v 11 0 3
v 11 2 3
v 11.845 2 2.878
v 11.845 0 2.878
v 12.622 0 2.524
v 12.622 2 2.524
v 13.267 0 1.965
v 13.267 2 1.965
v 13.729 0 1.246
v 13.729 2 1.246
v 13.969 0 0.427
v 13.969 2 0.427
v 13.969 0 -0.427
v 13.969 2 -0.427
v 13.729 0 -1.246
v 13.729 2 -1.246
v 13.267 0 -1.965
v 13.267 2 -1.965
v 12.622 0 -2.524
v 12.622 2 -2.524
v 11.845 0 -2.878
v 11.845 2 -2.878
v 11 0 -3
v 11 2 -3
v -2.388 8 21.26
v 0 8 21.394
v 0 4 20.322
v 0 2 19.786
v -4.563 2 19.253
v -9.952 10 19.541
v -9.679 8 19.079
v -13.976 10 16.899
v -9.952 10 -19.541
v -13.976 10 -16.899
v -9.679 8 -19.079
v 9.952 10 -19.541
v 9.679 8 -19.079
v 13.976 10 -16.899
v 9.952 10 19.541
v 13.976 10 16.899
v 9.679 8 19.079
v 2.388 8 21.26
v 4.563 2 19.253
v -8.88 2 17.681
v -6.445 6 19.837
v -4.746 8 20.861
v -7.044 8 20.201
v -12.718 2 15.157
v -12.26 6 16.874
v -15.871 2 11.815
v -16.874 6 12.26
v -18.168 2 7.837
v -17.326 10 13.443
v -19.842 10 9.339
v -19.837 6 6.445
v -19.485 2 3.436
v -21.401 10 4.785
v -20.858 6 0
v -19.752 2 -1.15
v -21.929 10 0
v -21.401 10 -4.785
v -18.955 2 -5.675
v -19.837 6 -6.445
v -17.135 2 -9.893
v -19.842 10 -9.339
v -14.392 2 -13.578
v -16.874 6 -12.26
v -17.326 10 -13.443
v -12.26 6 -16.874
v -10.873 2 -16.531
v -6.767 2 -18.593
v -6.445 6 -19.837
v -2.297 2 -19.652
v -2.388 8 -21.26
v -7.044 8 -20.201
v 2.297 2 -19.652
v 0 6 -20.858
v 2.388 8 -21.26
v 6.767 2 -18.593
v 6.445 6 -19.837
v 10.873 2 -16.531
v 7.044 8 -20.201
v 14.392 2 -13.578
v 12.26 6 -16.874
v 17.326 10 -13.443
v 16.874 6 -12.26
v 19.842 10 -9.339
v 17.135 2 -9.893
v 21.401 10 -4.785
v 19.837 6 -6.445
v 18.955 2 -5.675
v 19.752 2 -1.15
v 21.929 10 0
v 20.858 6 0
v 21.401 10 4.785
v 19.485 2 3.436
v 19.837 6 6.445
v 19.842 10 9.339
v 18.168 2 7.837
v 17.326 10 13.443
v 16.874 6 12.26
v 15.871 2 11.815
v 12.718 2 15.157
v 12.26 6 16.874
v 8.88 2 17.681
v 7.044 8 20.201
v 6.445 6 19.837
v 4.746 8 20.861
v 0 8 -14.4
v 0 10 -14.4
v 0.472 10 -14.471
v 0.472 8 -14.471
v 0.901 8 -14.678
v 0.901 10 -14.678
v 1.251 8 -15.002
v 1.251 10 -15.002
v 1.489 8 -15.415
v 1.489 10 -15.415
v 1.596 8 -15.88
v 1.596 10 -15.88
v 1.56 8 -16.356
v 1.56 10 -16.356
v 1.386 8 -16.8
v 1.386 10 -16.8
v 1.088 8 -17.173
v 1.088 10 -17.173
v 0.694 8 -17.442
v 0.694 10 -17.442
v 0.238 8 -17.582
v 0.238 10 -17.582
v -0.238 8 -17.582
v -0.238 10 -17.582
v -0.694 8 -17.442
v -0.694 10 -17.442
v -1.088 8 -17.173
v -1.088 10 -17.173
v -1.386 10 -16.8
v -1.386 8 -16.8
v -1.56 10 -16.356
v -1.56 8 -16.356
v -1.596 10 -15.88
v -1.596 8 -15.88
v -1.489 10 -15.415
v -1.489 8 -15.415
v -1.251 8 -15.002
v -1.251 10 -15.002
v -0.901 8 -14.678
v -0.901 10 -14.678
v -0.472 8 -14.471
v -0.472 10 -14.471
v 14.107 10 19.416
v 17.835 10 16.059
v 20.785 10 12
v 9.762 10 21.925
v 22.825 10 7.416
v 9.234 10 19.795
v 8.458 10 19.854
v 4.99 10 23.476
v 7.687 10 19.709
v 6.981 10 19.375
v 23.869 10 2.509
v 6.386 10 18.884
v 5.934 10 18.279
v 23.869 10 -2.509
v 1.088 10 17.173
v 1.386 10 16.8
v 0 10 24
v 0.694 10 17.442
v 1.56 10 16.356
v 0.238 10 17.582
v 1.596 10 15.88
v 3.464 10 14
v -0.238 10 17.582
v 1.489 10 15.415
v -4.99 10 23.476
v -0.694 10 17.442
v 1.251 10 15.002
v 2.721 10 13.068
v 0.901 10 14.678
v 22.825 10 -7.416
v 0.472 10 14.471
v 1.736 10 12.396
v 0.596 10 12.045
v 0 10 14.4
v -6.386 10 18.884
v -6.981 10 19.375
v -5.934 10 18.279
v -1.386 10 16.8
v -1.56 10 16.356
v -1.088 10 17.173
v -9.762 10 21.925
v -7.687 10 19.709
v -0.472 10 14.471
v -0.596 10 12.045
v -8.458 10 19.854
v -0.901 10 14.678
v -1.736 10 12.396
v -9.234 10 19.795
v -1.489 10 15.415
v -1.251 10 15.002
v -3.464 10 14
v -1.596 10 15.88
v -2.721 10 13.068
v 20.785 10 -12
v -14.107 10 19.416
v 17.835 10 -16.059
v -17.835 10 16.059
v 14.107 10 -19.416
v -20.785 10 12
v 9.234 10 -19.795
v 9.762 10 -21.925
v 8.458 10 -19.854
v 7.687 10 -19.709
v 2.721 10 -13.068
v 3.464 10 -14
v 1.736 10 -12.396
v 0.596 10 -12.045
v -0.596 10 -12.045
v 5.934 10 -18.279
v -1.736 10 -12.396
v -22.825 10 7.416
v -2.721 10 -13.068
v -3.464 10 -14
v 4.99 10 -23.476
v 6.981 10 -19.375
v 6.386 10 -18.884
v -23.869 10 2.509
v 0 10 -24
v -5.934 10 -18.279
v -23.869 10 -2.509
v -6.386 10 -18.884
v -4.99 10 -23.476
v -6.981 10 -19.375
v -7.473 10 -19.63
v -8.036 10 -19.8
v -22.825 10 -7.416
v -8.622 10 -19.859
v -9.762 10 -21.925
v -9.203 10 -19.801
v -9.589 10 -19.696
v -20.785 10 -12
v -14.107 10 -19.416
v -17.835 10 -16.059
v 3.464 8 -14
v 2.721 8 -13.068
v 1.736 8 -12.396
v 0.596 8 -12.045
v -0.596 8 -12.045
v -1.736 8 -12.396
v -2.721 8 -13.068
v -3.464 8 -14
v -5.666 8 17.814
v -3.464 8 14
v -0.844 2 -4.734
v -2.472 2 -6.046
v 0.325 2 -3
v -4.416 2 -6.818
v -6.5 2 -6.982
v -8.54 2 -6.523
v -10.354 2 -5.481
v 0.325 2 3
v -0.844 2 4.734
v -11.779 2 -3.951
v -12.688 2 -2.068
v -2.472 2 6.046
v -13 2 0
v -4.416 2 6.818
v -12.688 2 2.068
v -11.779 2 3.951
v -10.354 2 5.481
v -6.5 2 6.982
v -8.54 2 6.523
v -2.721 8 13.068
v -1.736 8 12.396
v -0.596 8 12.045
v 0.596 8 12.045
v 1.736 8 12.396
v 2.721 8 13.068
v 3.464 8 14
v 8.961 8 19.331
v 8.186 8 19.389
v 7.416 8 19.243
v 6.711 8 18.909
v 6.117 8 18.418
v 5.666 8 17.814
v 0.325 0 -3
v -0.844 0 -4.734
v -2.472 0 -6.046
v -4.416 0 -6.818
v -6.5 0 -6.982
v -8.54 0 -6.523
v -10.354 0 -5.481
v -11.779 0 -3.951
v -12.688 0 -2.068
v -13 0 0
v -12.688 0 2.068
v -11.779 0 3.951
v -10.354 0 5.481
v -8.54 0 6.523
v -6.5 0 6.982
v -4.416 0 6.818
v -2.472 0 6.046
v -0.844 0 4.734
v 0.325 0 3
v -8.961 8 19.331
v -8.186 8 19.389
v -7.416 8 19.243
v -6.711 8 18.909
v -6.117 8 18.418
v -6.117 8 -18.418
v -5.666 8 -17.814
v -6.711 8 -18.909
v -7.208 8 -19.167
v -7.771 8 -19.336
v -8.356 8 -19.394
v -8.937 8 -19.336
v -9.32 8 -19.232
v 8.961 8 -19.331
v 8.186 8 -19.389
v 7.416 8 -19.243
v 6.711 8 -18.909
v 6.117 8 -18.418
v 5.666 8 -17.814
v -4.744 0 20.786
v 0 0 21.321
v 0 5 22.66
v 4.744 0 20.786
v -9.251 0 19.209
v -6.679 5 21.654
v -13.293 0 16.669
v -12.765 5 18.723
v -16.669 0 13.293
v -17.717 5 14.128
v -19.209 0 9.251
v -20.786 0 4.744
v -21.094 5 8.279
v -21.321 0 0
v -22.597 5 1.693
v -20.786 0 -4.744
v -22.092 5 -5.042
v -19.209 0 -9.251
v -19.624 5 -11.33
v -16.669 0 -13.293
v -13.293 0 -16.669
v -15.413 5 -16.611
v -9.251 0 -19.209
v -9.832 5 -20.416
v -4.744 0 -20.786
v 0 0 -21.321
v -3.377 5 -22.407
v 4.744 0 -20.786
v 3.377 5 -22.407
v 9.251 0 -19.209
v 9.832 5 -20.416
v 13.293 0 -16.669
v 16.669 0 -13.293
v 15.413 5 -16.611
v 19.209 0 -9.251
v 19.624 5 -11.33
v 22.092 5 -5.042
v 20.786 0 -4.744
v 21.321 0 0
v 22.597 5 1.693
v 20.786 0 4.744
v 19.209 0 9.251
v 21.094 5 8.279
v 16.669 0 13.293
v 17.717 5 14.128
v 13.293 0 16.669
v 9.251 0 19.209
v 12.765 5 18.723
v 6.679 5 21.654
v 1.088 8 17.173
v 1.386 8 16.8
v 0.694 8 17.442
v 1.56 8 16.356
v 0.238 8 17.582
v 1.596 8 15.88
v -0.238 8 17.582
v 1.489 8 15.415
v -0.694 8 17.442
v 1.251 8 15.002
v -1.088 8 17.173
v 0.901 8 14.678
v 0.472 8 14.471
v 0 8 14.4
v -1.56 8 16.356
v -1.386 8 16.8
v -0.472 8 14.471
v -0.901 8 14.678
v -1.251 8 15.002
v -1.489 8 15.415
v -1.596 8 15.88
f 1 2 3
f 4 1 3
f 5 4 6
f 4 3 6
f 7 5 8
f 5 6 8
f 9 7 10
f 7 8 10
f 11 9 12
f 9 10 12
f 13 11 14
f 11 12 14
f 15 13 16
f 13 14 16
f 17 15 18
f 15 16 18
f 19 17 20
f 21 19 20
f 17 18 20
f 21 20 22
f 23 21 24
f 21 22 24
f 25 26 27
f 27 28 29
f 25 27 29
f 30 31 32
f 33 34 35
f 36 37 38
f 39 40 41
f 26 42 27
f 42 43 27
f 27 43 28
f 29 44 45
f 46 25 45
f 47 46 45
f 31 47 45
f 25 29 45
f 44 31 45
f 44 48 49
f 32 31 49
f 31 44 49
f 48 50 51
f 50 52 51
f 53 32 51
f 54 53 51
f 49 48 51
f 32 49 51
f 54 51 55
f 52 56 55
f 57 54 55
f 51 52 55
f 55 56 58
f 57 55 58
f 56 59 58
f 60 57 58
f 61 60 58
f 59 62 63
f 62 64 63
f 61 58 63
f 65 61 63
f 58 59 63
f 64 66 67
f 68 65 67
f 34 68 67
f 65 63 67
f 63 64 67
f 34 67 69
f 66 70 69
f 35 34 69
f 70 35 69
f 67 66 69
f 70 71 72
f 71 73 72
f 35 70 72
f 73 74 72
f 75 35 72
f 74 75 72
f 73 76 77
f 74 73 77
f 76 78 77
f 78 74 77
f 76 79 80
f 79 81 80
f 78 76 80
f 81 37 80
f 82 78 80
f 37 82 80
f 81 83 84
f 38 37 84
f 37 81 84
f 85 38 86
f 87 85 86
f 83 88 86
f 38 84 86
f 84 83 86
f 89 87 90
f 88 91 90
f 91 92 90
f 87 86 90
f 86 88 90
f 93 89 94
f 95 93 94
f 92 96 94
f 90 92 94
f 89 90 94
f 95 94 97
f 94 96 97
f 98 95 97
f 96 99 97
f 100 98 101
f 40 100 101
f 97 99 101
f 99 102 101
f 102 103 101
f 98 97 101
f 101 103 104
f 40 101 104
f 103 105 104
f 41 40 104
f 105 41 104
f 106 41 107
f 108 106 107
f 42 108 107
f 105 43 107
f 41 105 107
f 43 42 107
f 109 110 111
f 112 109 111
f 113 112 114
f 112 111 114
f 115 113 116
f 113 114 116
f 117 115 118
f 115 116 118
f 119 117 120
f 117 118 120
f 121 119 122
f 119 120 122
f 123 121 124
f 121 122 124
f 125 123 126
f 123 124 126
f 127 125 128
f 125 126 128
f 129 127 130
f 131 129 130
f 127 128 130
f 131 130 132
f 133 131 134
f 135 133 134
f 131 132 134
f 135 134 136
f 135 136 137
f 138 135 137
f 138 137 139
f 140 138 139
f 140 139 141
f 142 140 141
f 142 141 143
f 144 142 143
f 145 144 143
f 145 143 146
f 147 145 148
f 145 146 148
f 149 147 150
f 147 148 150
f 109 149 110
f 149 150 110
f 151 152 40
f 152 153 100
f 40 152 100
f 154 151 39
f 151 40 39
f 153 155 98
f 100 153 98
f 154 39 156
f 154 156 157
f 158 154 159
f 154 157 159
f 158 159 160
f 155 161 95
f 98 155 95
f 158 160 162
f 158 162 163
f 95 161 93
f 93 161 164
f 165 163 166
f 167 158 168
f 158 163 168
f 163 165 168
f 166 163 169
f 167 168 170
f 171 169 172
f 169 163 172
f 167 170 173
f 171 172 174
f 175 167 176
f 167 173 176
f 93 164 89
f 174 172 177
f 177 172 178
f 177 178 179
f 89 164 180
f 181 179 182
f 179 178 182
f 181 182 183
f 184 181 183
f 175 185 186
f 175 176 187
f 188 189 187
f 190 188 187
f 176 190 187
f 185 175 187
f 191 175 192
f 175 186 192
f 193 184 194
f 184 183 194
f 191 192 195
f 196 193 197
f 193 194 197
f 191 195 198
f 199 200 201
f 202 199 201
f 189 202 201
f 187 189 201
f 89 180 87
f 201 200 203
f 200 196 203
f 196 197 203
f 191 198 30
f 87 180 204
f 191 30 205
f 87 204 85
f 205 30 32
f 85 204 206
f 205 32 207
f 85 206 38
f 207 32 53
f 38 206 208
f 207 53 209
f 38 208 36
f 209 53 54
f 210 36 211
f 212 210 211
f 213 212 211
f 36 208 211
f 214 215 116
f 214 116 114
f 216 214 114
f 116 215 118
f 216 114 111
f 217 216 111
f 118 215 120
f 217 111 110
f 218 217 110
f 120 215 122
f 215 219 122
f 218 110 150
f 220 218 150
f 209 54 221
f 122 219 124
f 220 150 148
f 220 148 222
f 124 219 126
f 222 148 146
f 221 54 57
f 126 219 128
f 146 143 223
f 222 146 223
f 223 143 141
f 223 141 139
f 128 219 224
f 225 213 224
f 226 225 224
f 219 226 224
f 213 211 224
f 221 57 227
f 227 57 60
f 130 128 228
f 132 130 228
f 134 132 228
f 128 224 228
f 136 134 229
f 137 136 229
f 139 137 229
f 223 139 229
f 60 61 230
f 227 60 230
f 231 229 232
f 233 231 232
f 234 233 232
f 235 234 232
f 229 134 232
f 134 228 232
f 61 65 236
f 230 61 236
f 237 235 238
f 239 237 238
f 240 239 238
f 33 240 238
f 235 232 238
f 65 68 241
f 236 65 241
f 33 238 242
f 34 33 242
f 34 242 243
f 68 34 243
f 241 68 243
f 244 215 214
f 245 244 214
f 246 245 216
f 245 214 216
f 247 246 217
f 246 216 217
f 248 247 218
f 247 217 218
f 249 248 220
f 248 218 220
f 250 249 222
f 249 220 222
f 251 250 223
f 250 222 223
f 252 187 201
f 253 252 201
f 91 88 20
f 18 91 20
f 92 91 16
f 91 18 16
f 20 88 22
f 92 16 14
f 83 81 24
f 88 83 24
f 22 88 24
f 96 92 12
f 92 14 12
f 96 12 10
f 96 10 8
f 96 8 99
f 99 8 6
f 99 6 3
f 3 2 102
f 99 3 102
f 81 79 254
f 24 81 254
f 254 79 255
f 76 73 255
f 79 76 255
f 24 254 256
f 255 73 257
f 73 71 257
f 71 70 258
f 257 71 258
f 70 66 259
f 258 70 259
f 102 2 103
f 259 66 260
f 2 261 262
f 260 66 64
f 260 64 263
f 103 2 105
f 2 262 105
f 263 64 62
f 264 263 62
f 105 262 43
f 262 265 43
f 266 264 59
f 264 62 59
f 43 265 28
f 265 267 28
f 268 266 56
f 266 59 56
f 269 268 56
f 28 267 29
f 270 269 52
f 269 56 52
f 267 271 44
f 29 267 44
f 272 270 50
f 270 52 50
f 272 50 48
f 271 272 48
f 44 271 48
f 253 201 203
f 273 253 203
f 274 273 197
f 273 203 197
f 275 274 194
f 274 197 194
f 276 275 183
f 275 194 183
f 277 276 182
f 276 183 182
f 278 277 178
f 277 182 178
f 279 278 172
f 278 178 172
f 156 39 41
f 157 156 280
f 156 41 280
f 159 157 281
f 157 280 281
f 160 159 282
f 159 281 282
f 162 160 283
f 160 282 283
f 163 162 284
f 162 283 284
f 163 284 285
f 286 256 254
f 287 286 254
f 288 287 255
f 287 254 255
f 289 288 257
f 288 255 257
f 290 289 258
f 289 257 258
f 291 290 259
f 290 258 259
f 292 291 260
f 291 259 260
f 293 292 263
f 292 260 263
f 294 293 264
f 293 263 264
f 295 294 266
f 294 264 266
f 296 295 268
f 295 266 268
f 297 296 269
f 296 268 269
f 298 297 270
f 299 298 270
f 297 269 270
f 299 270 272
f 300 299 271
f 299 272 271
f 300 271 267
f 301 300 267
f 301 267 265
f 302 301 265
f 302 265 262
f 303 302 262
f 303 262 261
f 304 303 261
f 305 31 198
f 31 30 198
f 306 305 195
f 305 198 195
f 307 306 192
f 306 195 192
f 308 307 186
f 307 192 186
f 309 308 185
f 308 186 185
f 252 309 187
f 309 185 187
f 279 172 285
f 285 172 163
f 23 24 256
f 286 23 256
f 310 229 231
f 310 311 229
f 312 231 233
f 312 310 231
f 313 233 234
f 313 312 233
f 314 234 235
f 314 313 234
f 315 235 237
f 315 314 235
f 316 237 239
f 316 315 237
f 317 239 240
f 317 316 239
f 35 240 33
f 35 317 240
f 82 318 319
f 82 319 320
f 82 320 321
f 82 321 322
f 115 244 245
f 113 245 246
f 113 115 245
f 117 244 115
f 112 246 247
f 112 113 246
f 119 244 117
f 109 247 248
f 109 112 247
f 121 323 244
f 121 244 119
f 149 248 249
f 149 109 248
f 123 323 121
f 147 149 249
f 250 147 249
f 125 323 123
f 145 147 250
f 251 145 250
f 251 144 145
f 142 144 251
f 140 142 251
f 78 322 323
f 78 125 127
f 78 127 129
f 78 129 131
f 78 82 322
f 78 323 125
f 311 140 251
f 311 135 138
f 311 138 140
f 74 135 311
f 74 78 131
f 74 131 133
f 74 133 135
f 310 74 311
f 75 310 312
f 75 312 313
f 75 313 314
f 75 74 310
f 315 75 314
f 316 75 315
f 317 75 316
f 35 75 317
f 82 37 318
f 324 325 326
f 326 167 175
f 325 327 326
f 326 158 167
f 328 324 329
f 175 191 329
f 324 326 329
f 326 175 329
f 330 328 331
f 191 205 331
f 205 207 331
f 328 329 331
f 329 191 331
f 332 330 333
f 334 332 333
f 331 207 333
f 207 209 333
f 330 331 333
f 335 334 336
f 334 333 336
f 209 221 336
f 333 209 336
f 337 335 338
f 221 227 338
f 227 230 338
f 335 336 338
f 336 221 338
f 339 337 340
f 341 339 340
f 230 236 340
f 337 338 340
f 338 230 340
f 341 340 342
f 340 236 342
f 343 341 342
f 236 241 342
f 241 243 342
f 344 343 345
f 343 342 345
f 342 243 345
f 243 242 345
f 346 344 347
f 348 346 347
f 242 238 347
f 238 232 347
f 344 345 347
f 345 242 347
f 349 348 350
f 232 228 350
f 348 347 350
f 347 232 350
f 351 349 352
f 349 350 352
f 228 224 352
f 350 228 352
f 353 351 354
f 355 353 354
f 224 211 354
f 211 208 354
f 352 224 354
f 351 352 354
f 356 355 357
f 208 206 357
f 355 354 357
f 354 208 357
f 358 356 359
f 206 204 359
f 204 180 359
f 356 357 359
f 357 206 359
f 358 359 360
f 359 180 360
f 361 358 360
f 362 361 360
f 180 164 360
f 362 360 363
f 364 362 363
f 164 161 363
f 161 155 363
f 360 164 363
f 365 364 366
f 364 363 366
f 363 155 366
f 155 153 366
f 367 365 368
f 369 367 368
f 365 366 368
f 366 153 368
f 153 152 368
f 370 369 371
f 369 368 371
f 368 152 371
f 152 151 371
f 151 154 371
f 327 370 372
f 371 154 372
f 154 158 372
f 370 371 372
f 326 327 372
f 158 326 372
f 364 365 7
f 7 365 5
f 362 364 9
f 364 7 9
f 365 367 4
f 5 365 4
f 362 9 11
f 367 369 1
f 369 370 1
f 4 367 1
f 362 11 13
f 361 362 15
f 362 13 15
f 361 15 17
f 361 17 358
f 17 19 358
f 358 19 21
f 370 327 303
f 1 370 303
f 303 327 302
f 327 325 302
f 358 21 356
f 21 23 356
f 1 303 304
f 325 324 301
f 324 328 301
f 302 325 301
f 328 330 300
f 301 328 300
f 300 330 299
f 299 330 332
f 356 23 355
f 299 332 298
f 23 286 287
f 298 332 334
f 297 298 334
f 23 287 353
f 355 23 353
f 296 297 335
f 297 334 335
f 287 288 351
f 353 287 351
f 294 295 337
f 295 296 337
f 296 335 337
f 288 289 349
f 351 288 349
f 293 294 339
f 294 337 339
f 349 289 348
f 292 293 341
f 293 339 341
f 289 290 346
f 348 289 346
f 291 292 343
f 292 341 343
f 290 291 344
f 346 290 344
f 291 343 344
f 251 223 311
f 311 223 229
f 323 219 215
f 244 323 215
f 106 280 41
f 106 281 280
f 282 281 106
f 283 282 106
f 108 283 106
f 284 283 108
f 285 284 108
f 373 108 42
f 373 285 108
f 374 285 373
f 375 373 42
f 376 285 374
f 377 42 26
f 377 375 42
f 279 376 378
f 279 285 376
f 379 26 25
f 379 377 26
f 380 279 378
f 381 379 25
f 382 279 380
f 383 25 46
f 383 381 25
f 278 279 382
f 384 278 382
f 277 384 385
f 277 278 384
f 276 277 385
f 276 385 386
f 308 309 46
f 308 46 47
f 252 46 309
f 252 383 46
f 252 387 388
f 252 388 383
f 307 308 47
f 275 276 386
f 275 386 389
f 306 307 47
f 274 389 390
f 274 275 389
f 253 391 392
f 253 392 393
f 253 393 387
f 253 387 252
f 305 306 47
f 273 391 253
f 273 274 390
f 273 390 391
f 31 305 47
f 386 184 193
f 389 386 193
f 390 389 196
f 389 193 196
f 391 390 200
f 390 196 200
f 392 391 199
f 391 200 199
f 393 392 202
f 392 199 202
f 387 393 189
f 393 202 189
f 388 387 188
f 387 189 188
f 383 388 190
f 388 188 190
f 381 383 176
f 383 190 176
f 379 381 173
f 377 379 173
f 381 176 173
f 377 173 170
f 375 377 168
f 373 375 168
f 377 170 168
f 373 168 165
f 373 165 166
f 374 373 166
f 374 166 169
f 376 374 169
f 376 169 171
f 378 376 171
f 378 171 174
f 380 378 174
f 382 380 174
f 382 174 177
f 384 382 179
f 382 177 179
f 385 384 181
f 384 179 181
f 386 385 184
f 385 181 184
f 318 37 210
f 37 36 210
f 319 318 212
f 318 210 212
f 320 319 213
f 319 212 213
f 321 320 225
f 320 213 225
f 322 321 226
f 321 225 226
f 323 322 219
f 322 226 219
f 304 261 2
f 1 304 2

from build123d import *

# Parameters (mm, degrees)
CUT_EXTRUDE_1_REACH = 36.871
SKETCH_3_R          = 1.6
EXTRUDE_1_DEPTH     = 2
FILLET_1_R          = 3


with BuildPart() as part:
    # 草图1 → 旋转1 (revolve)
    with BuildSketch(Plane.XY, mode=Mode.PRIVATE) as revolve_1_sk:
        Polygon((0, 0), (21.320508076, 0), (24, 10), (21.929447639, 10), (19.7858541, 2), (0, 2), align=None)
    revolve(revolve_1_sk.sketch.rotate(Axis((0, 25.167510642, 0), (0, -1, 0)), 90), axis=Axis((0, 25.167510642, 0), (0, -1, 0)))

    # 草图2 → 切除-拉伸1 (cut, up to next)
    with BuildSketch(Plane(origin=(0, 2, 0), x_dir=(1, 0, 0), z_dir=(0, 1, 0)), mode=Mode.PRIVATE) as cut_extrude_1_sk1:
        with BuildLine():
            Line((11, 3), (0.32455532, 3))
            ThreePointArc((0.32455532, 3), (-13, 0), (0.32455532, -3))
            Line((0.32455532, -3), (11, -3))
            ThreePointArc((11, -3), (14, 0), (11, 3))
        make_face()
    cut_extrude_1_tool1 = extrude(cut_extrude_1_sk1.sketch, amount=-CUT_EXTRUDE_1_REACH, mode=Mode.PRIVATE) & part.part
    add(cut_extrude_1_tool1.solids().sort_by_distance((-1.696004, 2, 0))[0], mode=Mode.SUBTRACT)

    # 草图3 → 凸台-拉伸1 (add)
    # profile 1 of 2: a face of its own
    with BuildSketch(Plane(origin=(0, 10, 0), x_dir=(1, 0, 0), z_dir=(0, 1, 0))):
        with BuildLine():
            Line((-3.464101615, 14), (-7.316676114, 20.672854772))
            ThreePointArc((-7.316676114, 20.672854772), (0, 21.929447639), (7.316676114, 20.672854772))
            Line((7.316676114, 20.672854772), (3.464101615, 14))
            ThreePointArc((3.464101615, 14), (0, 12), (-3.464101615, 14))
        make_face()
        with Locations(Location((0, 16, 0), (0, 0, 270))):
            Circle(SKETCH_3_R, mode=Mode.SUBTRACT)
    # profile 2 of 2: a face of its own
    with BuildSketch(Plane(origin=(0, 10, 0), x_dir=(1, 0, 0), z_dir=(0, 1, 0))):
        with BuildLine():
            Line((3.464101615, -14), (7.316676114, -20.672854772))
            ThreePointArc((7.316676114, -20.672854772), (0, -21.929447639), (-7.316676114, -20.672854772))
            Line((-7.316676114, -20.672854772), (-3.464101615, -14))
            ThreePointArc((-3.464101615, -14), (0, -12), (3.464101615, -14))
        make_face()
        with Locations(Location((0, -16, 0), (0, 0, 90))):
            Circle(SKETCH_3_R, mode=Mode.SUBTRACT)
    extrude(amount=-EXTRUDE_1_DEPTH)

    # 圆角1
    fillet_1_edges = [part.edges().sort_by_distance(p)[0] for p in [
        (-7.180384511, 8.99998489, -20.436790791),
        (7.180384511, 8.99998489, -20.436790791),
        (-7.180384511, 8.99998489, 20.436790791),
        (7.180384511, 8.99998489, 20.436790791),
    ]]
    fillet(fillet_1_edges, radius=FILLET_1_R)


solid = part.part
